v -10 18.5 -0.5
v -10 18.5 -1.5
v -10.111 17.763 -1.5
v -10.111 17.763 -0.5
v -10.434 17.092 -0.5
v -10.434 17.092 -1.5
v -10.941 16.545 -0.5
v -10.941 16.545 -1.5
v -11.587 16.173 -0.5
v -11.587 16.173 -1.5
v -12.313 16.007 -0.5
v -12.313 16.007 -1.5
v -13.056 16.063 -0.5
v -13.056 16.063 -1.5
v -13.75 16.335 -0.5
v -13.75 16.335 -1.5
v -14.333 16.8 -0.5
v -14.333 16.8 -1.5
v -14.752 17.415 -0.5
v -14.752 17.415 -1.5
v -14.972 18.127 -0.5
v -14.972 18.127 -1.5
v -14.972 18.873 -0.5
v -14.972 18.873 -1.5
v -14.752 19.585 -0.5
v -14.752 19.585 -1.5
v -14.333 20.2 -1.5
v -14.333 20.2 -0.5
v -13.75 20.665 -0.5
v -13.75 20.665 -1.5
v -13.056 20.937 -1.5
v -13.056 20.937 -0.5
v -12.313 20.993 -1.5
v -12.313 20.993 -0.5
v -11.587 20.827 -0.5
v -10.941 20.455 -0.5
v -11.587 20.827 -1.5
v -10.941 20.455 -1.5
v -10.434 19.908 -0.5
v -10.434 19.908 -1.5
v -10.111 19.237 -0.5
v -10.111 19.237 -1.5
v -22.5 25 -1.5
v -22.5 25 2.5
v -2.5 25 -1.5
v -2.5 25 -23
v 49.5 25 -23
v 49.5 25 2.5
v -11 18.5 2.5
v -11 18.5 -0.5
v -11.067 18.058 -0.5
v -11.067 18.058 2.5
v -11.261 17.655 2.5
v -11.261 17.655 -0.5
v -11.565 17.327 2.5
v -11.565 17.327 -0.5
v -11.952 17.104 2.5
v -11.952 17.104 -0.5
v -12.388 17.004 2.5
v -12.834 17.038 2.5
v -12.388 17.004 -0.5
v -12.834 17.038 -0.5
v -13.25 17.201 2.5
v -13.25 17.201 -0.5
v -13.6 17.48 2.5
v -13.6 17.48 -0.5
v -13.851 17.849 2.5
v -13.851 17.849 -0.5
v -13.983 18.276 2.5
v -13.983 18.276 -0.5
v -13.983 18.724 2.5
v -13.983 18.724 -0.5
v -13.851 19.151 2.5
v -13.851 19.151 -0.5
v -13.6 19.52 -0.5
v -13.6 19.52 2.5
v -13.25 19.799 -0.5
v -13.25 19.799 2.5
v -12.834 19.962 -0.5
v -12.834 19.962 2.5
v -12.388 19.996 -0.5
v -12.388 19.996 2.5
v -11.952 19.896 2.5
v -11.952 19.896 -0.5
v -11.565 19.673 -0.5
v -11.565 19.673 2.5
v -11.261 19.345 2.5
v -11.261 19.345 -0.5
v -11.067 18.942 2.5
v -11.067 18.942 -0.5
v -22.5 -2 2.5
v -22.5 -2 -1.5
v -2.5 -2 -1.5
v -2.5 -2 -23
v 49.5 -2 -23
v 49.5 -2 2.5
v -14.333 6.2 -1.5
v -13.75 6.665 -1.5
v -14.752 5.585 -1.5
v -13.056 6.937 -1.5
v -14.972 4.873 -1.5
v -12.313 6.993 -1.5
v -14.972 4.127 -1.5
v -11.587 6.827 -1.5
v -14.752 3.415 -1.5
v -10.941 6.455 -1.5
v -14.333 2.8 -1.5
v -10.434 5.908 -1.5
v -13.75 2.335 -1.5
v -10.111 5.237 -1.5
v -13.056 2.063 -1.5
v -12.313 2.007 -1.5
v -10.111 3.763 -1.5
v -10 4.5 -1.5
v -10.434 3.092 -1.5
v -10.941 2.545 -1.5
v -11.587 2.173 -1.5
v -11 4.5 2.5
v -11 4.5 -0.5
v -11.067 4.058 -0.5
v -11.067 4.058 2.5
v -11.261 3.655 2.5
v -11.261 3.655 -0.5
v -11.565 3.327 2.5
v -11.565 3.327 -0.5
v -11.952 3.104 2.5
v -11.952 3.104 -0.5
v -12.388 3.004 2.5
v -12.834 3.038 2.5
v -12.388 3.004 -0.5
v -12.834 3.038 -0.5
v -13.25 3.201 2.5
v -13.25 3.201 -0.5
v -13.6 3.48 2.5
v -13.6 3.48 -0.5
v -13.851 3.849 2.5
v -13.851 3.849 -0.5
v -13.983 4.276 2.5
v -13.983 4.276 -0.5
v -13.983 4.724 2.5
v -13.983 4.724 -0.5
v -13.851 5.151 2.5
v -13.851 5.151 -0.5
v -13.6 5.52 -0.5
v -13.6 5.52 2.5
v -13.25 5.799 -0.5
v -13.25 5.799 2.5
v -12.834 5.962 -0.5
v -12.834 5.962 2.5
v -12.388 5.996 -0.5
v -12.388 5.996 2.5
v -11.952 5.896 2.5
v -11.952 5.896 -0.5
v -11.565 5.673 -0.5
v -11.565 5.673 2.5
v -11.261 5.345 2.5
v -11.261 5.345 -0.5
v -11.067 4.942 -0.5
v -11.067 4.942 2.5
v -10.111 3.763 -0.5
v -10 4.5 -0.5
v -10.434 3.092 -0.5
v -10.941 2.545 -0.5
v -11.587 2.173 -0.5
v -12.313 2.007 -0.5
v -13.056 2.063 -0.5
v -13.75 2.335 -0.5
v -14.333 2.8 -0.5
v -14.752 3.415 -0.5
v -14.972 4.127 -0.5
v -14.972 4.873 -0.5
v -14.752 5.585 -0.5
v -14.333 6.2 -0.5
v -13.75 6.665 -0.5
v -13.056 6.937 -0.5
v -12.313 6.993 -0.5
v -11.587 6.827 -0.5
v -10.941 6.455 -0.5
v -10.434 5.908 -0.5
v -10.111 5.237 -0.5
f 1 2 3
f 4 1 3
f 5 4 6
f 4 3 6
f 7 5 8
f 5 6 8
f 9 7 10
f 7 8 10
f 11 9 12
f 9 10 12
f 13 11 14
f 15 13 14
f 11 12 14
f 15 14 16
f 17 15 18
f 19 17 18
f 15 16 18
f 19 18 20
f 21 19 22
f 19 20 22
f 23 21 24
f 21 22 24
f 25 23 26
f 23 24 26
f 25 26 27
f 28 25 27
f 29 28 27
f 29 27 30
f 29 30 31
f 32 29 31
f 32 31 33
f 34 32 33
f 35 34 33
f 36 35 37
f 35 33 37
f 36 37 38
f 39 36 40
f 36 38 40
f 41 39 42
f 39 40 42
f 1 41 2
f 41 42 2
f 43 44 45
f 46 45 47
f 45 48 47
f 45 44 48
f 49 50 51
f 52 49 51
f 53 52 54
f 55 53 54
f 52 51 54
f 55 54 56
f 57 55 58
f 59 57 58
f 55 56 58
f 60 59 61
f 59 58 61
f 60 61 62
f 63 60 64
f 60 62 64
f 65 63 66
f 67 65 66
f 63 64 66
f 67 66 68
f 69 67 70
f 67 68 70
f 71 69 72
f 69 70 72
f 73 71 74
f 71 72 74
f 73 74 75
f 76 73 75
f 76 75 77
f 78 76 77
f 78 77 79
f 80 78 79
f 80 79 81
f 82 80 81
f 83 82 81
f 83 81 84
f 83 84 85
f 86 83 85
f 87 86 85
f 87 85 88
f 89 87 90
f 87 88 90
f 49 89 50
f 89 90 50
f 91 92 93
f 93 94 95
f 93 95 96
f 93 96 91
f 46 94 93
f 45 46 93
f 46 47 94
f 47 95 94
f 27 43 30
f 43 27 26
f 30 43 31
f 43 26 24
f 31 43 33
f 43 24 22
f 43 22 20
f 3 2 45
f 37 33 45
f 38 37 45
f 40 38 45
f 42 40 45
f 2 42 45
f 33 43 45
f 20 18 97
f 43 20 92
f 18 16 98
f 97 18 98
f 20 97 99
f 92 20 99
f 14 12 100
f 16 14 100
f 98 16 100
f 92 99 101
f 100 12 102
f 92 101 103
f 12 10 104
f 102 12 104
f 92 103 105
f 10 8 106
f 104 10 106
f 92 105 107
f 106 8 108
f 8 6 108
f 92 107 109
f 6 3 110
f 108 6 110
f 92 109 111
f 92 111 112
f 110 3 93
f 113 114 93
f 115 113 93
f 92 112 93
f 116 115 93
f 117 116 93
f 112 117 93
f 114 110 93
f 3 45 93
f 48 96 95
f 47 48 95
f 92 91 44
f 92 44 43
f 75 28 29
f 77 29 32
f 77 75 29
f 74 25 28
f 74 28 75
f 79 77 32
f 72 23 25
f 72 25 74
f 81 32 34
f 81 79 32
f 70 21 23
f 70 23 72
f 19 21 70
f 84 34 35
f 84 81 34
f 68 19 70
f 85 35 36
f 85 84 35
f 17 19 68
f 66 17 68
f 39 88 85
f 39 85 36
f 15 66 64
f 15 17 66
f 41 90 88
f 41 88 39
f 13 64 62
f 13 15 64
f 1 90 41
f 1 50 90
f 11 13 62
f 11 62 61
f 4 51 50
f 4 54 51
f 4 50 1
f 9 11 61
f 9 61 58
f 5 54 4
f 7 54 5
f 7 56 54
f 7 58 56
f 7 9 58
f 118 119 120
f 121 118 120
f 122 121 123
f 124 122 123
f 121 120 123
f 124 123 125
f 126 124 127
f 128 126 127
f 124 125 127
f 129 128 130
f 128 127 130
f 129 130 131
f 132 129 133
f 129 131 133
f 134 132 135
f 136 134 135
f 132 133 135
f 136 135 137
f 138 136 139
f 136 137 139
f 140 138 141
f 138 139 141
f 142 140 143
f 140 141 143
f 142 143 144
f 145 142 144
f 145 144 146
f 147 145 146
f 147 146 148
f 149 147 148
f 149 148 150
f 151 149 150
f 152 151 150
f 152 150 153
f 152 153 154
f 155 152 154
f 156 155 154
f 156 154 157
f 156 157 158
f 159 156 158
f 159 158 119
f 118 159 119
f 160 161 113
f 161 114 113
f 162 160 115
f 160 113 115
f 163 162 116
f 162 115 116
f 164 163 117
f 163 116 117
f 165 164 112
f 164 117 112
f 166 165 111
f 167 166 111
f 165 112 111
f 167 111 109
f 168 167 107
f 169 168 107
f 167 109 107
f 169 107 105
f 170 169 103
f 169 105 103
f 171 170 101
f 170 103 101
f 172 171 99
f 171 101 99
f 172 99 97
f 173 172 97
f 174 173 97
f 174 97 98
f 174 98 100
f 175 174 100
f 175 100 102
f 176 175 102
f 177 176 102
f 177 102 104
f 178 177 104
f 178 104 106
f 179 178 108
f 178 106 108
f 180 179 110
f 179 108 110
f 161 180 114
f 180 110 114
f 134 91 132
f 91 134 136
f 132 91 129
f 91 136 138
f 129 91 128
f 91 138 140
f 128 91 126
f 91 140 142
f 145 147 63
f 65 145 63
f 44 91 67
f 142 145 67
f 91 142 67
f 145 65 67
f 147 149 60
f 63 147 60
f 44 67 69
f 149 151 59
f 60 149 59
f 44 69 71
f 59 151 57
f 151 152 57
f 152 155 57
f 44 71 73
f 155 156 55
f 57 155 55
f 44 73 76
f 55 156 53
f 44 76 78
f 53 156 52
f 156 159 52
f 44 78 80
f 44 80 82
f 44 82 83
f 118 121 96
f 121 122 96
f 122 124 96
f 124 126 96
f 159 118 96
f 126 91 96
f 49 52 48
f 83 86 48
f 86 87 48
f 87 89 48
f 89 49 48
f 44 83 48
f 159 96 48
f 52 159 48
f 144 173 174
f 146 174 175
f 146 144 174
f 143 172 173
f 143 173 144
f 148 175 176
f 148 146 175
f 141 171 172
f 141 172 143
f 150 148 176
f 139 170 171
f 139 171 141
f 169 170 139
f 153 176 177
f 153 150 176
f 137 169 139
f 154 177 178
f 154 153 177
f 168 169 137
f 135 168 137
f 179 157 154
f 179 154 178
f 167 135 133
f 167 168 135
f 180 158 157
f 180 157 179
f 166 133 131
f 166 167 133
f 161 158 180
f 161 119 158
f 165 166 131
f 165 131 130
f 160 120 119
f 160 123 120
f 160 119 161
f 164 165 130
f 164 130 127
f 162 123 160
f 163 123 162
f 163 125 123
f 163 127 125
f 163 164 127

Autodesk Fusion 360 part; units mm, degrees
sketch "Sketch1" plane through (0, 0, 0) normal (0, 1, 0) x (1, 0, 0)
  line L0 (0, 0) -> (47, 0) construction
  line L1 (47, 0) -> (47, 20.5) construction
  line L2 (47, 20.5) -> (0, 20.5) construction
  line L3 (0, 20.5) -> (0, 0) construction
  line L4 (-0.5, -0.5) -> (47.5, -0.5)
  line L5 (47.5, -0.5) -> (47.5, 21)
  line L6 (47.5, 21) -> (-0.5, 21)
  line L7 (-0.5, 21) -> (-0.5, -0.5)
  dimension "d1" = 47
  dimension "d2" = 20.5
  dimension "d3" = 0.5
extrude "Extrude1" add sketch "Sketch1" along normal blind 25 makes body 1
copy_body "Body->Comp1" bodies 1 removing the originals makes body 2 in component "ServoMount"
shell "Shell1" thickness 2 outward yes removed faces 0 bodies 2 in component "ServoMount"
extrude "Extrude1'" cut 1 faces at (14.8333, 27, -14.5) along direction (0, -1, 0) blind 2 on bodies 2 bodies 2 in component "ServoMount"
ref_plane "WorkPlane1" through (-2.5, 11.5, -10.25) normal (-1, 0, 0) x (0, 0, 1)
sketch "Sketch2" plane through (-2.5, 11.5, -10.25) normal (-1, 0, 0) x (0, 0, -1) in component "ServoMount"
  line L0 (-12.75, -13.5) -> (-8.75, -13.5)
  line L1 (-8.75, -13.5) -> (-8.75, 13.5)
  line L2 (-8.75, 13.5) -> (-12.75, 13.5)
  line L3 (-12.75, 13.5) -> (-12.75, -13.5)
  point P0 (-12.75, -13.5)
  dimension "d10" = 4
extrude "Extrude2" add sketch "Sketch2" along normal blind 20 bodies 2 in component "ServoMount"
ref_plane "WorkPlane2" through (-12.5, 11.5, -1.5) normal (0, 0, -1) x (0, -1, 0) in component "ServoMount"
sketch "Sketch3" plane through (-12.5, 11.5, -1.5) normal (0, 0, -1) x (1, 0, 0) in component "ServoMount"
  circle A0 centre (0, -7) radius 1.5
  line L0 (10, -13.5) -> (-10, -13.5)
  line L1 (-10, -13.5) -> (-10, 13.5)
  circle A1 centre (0, 7) radius 1.5
  line L2 (10, 13.5) -> (-10, 13.5)
  circle A2 centre (0, -7) radius 2.5
  circle A3 centre (0, 7) radius 2.5
  dimension "d14" = 3
  dimension "d15" = 6.5
  dimension "d16" = 10
  dimension "d17" = 3
  dimension "d18" = 10
  dimension "d19" = 6.5
  dimension "d24" = 1
  dimension "d25" = 1
extrude "Extrude3" cut sketch "Sketch3" against normal up to surface (4 mm away) contours A0 bodies 2 in component "ServoMount"
extrude "Extrude4" cut sketch "Sketch3" against normal up to surface (4 mm away) contours A1 bodies 2 in component "ServoMount"
extrude "Extrude5" cut sketch "Sketch3" against normal blind 1 contours A2 bodies 2 in component "ServoMount"
extrude "Extrude6" cut sketch "Sketch3" against normal blind 1 contours A3 bodies 2 in component "ServoMount"
component "ServoMount" placed x (1, 0, 0) y (0, 1, 0) z (0, 0, 1) at (0, 0, 0)
